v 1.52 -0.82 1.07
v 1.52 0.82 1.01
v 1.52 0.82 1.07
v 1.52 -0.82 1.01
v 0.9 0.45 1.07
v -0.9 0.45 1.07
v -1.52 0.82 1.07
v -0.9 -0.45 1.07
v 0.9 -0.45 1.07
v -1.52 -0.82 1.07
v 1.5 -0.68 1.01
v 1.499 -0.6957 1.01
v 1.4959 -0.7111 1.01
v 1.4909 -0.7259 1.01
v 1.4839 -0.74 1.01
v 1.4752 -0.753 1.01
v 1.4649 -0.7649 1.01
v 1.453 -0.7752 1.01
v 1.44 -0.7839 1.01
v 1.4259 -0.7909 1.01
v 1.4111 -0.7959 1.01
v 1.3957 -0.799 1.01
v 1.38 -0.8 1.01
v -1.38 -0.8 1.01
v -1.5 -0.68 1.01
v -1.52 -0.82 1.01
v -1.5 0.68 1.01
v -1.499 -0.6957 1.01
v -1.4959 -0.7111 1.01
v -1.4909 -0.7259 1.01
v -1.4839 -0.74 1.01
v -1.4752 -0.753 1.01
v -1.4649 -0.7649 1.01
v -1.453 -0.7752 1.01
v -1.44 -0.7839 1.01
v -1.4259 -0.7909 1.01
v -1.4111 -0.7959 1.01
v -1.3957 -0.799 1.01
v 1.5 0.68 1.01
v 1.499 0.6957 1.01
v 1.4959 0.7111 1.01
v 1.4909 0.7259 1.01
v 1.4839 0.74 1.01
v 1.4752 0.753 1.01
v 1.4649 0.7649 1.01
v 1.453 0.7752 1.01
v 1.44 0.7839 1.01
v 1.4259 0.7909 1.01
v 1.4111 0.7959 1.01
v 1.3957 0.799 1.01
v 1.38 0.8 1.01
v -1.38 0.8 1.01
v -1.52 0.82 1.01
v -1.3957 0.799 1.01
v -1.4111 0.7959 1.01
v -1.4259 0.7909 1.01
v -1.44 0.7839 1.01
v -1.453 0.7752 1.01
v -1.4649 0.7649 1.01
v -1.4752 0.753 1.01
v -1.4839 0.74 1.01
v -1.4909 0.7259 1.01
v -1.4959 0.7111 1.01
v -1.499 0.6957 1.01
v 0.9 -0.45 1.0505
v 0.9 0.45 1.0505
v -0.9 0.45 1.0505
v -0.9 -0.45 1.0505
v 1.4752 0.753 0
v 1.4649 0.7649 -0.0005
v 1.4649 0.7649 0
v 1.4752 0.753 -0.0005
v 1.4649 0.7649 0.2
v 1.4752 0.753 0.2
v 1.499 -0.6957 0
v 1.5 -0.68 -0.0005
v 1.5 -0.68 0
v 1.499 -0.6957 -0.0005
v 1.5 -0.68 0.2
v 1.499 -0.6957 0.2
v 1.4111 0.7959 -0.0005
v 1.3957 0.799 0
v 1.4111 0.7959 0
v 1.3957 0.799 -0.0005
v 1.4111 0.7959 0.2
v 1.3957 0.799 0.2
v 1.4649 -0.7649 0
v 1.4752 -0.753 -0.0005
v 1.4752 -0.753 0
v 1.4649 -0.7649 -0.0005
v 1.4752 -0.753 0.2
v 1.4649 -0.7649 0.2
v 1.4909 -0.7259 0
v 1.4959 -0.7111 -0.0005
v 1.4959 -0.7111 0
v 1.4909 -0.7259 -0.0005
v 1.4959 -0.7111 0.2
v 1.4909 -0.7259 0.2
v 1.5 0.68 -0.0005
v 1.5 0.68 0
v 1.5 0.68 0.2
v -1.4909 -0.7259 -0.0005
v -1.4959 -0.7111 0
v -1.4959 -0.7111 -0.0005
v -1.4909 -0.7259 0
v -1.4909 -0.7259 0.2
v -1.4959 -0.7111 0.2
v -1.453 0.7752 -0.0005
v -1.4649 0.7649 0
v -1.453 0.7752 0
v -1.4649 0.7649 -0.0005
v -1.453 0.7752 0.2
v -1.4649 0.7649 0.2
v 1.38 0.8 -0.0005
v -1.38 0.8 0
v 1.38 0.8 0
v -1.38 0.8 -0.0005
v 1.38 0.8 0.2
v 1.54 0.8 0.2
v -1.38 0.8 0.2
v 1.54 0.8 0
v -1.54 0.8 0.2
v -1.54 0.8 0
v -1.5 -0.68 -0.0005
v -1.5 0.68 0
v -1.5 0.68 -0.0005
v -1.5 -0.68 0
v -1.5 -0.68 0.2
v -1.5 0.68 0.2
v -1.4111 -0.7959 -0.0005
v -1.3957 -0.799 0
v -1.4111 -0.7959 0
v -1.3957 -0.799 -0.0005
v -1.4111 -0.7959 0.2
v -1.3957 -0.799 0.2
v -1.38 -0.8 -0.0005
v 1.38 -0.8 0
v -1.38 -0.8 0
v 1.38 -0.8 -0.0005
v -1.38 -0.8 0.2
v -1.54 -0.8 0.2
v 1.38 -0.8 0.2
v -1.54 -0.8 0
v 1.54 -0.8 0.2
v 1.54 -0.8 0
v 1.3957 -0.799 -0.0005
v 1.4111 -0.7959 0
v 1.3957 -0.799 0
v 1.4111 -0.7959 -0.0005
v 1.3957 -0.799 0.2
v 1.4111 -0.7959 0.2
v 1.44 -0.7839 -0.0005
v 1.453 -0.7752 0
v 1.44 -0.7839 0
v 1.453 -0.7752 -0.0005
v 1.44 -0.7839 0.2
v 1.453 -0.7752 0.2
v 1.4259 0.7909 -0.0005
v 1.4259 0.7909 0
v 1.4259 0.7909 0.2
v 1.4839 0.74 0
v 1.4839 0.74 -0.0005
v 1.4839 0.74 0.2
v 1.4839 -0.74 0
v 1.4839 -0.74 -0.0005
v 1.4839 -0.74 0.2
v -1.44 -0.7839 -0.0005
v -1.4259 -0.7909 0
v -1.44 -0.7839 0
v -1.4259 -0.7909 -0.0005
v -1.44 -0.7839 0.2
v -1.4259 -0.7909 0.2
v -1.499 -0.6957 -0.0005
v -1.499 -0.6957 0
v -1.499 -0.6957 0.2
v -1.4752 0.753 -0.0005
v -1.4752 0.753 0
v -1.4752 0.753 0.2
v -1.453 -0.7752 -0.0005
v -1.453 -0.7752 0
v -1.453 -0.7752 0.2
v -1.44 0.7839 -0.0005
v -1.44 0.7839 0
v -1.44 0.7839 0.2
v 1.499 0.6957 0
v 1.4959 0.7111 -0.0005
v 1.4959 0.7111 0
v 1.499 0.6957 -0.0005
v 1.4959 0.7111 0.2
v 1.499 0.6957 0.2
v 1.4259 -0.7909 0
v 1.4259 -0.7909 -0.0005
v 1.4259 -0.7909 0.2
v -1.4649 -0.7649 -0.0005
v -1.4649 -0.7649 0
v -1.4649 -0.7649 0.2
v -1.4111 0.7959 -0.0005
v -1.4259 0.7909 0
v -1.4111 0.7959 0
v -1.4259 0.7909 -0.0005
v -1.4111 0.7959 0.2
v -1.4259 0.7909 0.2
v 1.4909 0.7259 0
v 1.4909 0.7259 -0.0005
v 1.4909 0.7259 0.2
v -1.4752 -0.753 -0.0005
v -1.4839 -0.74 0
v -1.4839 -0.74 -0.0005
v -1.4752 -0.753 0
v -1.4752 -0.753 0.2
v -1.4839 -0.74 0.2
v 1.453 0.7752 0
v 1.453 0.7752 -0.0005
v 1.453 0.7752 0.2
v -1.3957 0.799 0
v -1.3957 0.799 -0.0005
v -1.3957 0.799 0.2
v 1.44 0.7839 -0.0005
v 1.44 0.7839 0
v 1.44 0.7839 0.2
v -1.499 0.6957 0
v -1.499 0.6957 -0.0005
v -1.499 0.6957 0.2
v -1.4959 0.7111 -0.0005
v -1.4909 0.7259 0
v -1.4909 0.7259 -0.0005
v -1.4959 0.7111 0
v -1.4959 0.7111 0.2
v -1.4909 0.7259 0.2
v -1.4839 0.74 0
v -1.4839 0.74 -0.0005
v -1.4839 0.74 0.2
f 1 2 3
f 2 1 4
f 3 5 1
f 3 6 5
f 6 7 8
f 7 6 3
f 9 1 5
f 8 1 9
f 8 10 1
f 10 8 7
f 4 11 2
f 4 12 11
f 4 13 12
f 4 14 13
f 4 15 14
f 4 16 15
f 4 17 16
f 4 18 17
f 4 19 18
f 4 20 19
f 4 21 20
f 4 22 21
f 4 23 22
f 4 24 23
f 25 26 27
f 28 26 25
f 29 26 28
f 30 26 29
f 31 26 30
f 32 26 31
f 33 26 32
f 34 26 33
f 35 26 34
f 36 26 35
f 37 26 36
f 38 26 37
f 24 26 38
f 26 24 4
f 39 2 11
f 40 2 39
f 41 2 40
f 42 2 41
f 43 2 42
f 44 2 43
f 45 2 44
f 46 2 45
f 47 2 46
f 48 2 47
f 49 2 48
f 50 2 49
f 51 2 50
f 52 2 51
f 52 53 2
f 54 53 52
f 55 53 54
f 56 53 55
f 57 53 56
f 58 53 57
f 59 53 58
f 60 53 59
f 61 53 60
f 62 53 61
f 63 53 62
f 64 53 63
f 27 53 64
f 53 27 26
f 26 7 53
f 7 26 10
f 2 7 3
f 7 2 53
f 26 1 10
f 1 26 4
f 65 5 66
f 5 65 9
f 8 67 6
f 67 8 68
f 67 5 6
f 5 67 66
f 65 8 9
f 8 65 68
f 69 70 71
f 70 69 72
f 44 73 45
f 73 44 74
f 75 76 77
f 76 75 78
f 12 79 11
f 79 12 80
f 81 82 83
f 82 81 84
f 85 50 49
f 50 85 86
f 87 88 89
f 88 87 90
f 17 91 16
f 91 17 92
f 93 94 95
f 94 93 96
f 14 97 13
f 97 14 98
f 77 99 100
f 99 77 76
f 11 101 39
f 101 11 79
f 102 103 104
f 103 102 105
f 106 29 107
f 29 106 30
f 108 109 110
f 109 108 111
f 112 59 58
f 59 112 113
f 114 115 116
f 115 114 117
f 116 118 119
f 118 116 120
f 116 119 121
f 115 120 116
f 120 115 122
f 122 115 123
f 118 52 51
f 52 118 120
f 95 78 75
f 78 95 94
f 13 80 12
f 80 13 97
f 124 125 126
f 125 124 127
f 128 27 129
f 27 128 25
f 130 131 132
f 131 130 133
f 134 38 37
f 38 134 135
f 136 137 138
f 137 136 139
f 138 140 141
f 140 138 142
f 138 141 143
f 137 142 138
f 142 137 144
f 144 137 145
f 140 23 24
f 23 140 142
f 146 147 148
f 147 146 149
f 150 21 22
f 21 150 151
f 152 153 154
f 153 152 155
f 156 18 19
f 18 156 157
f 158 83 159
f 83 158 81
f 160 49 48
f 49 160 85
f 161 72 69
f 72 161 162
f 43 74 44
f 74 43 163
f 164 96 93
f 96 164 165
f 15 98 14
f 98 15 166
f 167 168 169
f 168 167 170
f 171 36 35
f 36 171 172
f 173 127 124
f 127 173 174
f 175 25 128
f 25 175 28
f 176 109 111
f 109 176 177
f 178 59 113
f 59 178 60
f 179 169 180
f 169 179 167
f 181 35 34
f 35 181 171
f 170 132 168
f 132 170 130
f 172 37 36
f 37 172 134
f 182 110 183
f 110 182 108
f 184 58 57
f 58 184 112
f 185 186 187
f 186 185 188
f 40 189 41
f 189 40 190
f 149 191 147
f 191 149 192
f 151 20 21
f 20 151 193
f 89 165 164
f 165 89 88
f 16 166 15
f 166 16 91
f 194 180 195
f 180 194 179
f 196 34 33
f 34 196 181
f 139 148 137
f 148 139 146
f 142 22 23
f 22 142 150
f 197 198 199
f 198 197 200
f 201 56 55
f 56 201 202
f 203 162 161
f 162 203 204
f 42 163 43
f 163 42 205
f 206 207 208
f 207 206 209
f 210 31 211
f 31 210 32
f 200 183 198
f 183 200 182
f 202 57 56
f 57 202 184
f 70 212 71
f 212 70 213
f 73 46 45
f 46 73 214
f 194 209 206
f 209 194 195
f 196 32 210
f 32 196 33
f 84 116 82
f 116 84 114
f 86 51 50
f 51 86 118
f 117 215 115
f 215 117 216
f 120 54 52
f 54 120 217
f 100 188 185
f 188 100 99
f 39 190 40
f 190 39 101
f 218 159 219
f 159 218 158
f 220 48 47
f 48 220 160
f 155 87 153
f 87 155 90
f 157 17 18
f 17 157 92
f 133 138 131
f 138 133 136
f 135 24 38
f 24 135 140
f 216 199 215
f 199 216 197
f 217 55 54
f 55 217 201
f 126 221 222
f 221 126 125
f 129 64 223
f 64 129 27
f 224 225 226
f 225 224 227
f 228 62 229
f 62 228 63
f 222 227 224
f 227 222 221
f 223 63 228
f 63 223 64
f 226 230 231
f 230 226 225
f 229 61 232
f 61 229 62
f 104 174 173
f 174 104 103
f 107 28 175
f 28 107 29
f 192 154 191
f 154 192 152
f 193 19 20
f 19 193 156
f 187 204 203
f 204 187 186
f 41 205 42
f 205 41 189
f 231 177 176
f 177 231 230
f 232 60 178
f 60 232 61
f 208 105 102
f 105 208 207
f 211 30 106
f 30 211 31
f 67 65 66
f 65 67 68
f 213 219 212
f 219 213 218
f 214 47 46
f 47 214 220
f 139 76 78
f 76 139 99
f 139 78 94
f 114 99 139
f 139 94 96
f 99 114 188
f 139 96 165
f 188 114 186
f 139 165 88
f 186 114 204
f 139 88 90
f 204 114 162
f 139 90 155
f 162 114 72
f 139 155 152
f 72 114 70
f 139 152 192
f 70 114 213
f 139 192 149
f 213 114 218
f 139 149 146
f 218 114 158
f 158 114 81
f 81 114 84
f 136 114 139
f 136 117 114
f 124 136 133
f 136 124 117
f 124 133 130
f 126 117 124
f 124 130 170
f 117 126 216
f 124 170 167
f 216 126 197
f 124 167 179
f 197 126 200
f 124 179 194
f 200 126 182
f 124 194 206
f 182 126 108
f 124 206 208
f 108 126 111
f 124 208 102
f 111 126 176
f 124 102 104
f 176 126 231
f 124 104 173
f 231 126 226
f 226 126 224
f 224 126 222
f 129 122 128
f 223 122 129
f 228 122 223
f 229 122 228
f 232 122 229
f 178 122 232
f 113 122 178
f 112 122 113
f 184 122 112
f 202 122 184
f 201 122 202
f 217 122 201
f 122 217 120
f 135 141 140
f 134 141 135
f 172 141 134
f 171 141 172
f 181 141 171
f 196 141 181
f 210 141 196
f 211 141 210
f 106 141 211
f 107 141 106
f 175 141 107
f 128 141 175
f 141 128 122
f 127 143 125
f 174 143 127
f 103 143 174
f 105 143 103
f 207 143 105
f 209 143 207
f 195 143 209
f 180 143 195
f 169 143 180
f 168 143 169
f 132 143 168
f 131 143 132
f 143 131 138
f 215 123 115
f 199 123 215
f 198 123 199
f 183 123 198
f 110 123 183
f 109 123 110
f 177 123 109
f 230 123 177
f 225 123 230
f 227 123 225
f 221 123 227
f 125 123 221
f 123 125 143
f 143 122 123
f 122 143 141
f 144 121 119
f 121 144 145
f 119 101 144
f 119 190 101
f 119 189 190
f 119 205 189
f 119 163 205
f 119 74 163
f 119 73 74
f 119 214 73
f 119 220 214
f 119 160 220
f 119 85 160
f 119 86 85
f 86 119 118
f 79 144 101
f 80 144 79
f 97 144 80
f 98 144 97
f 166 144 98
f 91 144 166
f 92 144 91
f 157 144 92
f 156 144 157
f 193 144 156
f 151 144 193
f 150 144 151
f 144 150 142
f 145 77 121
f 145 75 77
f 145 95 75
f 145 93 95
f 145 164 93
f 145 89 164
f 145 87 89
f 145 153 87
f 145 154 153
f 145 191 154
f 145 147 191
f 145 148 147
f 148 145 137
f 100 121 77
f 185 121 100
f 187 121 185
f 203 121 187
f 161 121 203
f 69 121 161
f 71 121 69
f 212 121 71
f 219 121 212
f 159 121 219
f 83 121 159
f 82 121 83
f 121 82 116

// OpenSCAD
// SMD component target size: [3.0, 1.6, 1.05] (L, W, H)

// Parameters
chip_length = 3.0;
chip_width  = 1.6;
chip_height = 1.05;

termination_length = 0.3;   // along X
termination_height = 0.2;   // along Z (from bottom)

marking_height = 0.02;      // recessed into top
marking_margin_x = 0.6;     // margin from ends
marking_margin_y = 0.35;    // margin from sides

fillet_radius = 0.12;       // body edge rounding (XY)
overlap = 0.02;             // small overlap to guarantee watertight union
$fn = 48;

// Main module (ONE connected solid)
module smd_component() {
    union() {
        chip_body();
        end_termination_left();
        end_termination_right();
        top_marking_recess();   // recessed (difference) but kept as single solid via union wrapper below
    }
}

// Rounded rectangular prism body (exact overall size)
module chip_body() {
    // Use minkowski to create rounded edges in XY while keeping exact L/W/H
    // by shrinking the core by 2*fillet_radius in X and Y.
    minkowski() {
        translate([0, 0, chip_height/2])
            cube([chip_length - 2*fillet_radius, chip_width - 2*fillet_radius, chip_height], center=true);
        cylinder(r=fillet_radius, h=0.001, center=true);
    }
}

// Terminations: connected to body, flush with bottom, extend full width
module end_termination_left() {
    translate([
        -chip_length/2 + termination_length/2 - overlap,  // overlap into body
        0,
        termination_height/2
    ])
        cube([termination_length + 2*overlap, chip_width, termination_height], center=true);
}

module end_termination_right() {
    translate([
        chip_length/2 - termination_length/2 + overlap,   // overlap into body
        0,
        termination_height/2
    ])
        cube([termination_length + 2*overlap, chip_width, termination_height], center=true);
}

// Recessed top marking (engraved), not a floating piece
module top_marking_recess() {
    marking_len = max(0.1, chip_length - 2*marking_margin_x);
    marking_wid = max(0.1, chip_width  - 2*marking_margin_y);

    // Create recess by subtracting from a copy of the body volume region.
    // Implemented as: (body) + (terminations) + (body with recess removed) - (body)
    // Simplify: just subtract recess from a thin top slab that overlaps the body.
    difference() {
        // Thin slab at the top that overlaps into the body so subtraction affects the solid
        translate([0, 0, chip_height - marking_height/2])
            cube([chip_length + 2*overlap, chip_width + 2*overlap, marking_height + 2*overlap], center=true);

        // Recess volume
        translate([0, 0, chip_height - marking_height/2 + overlap])
            cube([marking_len, marking_wid, marking_height + 4*overlap], center=true);
    }
}

// Render
smd_component();
